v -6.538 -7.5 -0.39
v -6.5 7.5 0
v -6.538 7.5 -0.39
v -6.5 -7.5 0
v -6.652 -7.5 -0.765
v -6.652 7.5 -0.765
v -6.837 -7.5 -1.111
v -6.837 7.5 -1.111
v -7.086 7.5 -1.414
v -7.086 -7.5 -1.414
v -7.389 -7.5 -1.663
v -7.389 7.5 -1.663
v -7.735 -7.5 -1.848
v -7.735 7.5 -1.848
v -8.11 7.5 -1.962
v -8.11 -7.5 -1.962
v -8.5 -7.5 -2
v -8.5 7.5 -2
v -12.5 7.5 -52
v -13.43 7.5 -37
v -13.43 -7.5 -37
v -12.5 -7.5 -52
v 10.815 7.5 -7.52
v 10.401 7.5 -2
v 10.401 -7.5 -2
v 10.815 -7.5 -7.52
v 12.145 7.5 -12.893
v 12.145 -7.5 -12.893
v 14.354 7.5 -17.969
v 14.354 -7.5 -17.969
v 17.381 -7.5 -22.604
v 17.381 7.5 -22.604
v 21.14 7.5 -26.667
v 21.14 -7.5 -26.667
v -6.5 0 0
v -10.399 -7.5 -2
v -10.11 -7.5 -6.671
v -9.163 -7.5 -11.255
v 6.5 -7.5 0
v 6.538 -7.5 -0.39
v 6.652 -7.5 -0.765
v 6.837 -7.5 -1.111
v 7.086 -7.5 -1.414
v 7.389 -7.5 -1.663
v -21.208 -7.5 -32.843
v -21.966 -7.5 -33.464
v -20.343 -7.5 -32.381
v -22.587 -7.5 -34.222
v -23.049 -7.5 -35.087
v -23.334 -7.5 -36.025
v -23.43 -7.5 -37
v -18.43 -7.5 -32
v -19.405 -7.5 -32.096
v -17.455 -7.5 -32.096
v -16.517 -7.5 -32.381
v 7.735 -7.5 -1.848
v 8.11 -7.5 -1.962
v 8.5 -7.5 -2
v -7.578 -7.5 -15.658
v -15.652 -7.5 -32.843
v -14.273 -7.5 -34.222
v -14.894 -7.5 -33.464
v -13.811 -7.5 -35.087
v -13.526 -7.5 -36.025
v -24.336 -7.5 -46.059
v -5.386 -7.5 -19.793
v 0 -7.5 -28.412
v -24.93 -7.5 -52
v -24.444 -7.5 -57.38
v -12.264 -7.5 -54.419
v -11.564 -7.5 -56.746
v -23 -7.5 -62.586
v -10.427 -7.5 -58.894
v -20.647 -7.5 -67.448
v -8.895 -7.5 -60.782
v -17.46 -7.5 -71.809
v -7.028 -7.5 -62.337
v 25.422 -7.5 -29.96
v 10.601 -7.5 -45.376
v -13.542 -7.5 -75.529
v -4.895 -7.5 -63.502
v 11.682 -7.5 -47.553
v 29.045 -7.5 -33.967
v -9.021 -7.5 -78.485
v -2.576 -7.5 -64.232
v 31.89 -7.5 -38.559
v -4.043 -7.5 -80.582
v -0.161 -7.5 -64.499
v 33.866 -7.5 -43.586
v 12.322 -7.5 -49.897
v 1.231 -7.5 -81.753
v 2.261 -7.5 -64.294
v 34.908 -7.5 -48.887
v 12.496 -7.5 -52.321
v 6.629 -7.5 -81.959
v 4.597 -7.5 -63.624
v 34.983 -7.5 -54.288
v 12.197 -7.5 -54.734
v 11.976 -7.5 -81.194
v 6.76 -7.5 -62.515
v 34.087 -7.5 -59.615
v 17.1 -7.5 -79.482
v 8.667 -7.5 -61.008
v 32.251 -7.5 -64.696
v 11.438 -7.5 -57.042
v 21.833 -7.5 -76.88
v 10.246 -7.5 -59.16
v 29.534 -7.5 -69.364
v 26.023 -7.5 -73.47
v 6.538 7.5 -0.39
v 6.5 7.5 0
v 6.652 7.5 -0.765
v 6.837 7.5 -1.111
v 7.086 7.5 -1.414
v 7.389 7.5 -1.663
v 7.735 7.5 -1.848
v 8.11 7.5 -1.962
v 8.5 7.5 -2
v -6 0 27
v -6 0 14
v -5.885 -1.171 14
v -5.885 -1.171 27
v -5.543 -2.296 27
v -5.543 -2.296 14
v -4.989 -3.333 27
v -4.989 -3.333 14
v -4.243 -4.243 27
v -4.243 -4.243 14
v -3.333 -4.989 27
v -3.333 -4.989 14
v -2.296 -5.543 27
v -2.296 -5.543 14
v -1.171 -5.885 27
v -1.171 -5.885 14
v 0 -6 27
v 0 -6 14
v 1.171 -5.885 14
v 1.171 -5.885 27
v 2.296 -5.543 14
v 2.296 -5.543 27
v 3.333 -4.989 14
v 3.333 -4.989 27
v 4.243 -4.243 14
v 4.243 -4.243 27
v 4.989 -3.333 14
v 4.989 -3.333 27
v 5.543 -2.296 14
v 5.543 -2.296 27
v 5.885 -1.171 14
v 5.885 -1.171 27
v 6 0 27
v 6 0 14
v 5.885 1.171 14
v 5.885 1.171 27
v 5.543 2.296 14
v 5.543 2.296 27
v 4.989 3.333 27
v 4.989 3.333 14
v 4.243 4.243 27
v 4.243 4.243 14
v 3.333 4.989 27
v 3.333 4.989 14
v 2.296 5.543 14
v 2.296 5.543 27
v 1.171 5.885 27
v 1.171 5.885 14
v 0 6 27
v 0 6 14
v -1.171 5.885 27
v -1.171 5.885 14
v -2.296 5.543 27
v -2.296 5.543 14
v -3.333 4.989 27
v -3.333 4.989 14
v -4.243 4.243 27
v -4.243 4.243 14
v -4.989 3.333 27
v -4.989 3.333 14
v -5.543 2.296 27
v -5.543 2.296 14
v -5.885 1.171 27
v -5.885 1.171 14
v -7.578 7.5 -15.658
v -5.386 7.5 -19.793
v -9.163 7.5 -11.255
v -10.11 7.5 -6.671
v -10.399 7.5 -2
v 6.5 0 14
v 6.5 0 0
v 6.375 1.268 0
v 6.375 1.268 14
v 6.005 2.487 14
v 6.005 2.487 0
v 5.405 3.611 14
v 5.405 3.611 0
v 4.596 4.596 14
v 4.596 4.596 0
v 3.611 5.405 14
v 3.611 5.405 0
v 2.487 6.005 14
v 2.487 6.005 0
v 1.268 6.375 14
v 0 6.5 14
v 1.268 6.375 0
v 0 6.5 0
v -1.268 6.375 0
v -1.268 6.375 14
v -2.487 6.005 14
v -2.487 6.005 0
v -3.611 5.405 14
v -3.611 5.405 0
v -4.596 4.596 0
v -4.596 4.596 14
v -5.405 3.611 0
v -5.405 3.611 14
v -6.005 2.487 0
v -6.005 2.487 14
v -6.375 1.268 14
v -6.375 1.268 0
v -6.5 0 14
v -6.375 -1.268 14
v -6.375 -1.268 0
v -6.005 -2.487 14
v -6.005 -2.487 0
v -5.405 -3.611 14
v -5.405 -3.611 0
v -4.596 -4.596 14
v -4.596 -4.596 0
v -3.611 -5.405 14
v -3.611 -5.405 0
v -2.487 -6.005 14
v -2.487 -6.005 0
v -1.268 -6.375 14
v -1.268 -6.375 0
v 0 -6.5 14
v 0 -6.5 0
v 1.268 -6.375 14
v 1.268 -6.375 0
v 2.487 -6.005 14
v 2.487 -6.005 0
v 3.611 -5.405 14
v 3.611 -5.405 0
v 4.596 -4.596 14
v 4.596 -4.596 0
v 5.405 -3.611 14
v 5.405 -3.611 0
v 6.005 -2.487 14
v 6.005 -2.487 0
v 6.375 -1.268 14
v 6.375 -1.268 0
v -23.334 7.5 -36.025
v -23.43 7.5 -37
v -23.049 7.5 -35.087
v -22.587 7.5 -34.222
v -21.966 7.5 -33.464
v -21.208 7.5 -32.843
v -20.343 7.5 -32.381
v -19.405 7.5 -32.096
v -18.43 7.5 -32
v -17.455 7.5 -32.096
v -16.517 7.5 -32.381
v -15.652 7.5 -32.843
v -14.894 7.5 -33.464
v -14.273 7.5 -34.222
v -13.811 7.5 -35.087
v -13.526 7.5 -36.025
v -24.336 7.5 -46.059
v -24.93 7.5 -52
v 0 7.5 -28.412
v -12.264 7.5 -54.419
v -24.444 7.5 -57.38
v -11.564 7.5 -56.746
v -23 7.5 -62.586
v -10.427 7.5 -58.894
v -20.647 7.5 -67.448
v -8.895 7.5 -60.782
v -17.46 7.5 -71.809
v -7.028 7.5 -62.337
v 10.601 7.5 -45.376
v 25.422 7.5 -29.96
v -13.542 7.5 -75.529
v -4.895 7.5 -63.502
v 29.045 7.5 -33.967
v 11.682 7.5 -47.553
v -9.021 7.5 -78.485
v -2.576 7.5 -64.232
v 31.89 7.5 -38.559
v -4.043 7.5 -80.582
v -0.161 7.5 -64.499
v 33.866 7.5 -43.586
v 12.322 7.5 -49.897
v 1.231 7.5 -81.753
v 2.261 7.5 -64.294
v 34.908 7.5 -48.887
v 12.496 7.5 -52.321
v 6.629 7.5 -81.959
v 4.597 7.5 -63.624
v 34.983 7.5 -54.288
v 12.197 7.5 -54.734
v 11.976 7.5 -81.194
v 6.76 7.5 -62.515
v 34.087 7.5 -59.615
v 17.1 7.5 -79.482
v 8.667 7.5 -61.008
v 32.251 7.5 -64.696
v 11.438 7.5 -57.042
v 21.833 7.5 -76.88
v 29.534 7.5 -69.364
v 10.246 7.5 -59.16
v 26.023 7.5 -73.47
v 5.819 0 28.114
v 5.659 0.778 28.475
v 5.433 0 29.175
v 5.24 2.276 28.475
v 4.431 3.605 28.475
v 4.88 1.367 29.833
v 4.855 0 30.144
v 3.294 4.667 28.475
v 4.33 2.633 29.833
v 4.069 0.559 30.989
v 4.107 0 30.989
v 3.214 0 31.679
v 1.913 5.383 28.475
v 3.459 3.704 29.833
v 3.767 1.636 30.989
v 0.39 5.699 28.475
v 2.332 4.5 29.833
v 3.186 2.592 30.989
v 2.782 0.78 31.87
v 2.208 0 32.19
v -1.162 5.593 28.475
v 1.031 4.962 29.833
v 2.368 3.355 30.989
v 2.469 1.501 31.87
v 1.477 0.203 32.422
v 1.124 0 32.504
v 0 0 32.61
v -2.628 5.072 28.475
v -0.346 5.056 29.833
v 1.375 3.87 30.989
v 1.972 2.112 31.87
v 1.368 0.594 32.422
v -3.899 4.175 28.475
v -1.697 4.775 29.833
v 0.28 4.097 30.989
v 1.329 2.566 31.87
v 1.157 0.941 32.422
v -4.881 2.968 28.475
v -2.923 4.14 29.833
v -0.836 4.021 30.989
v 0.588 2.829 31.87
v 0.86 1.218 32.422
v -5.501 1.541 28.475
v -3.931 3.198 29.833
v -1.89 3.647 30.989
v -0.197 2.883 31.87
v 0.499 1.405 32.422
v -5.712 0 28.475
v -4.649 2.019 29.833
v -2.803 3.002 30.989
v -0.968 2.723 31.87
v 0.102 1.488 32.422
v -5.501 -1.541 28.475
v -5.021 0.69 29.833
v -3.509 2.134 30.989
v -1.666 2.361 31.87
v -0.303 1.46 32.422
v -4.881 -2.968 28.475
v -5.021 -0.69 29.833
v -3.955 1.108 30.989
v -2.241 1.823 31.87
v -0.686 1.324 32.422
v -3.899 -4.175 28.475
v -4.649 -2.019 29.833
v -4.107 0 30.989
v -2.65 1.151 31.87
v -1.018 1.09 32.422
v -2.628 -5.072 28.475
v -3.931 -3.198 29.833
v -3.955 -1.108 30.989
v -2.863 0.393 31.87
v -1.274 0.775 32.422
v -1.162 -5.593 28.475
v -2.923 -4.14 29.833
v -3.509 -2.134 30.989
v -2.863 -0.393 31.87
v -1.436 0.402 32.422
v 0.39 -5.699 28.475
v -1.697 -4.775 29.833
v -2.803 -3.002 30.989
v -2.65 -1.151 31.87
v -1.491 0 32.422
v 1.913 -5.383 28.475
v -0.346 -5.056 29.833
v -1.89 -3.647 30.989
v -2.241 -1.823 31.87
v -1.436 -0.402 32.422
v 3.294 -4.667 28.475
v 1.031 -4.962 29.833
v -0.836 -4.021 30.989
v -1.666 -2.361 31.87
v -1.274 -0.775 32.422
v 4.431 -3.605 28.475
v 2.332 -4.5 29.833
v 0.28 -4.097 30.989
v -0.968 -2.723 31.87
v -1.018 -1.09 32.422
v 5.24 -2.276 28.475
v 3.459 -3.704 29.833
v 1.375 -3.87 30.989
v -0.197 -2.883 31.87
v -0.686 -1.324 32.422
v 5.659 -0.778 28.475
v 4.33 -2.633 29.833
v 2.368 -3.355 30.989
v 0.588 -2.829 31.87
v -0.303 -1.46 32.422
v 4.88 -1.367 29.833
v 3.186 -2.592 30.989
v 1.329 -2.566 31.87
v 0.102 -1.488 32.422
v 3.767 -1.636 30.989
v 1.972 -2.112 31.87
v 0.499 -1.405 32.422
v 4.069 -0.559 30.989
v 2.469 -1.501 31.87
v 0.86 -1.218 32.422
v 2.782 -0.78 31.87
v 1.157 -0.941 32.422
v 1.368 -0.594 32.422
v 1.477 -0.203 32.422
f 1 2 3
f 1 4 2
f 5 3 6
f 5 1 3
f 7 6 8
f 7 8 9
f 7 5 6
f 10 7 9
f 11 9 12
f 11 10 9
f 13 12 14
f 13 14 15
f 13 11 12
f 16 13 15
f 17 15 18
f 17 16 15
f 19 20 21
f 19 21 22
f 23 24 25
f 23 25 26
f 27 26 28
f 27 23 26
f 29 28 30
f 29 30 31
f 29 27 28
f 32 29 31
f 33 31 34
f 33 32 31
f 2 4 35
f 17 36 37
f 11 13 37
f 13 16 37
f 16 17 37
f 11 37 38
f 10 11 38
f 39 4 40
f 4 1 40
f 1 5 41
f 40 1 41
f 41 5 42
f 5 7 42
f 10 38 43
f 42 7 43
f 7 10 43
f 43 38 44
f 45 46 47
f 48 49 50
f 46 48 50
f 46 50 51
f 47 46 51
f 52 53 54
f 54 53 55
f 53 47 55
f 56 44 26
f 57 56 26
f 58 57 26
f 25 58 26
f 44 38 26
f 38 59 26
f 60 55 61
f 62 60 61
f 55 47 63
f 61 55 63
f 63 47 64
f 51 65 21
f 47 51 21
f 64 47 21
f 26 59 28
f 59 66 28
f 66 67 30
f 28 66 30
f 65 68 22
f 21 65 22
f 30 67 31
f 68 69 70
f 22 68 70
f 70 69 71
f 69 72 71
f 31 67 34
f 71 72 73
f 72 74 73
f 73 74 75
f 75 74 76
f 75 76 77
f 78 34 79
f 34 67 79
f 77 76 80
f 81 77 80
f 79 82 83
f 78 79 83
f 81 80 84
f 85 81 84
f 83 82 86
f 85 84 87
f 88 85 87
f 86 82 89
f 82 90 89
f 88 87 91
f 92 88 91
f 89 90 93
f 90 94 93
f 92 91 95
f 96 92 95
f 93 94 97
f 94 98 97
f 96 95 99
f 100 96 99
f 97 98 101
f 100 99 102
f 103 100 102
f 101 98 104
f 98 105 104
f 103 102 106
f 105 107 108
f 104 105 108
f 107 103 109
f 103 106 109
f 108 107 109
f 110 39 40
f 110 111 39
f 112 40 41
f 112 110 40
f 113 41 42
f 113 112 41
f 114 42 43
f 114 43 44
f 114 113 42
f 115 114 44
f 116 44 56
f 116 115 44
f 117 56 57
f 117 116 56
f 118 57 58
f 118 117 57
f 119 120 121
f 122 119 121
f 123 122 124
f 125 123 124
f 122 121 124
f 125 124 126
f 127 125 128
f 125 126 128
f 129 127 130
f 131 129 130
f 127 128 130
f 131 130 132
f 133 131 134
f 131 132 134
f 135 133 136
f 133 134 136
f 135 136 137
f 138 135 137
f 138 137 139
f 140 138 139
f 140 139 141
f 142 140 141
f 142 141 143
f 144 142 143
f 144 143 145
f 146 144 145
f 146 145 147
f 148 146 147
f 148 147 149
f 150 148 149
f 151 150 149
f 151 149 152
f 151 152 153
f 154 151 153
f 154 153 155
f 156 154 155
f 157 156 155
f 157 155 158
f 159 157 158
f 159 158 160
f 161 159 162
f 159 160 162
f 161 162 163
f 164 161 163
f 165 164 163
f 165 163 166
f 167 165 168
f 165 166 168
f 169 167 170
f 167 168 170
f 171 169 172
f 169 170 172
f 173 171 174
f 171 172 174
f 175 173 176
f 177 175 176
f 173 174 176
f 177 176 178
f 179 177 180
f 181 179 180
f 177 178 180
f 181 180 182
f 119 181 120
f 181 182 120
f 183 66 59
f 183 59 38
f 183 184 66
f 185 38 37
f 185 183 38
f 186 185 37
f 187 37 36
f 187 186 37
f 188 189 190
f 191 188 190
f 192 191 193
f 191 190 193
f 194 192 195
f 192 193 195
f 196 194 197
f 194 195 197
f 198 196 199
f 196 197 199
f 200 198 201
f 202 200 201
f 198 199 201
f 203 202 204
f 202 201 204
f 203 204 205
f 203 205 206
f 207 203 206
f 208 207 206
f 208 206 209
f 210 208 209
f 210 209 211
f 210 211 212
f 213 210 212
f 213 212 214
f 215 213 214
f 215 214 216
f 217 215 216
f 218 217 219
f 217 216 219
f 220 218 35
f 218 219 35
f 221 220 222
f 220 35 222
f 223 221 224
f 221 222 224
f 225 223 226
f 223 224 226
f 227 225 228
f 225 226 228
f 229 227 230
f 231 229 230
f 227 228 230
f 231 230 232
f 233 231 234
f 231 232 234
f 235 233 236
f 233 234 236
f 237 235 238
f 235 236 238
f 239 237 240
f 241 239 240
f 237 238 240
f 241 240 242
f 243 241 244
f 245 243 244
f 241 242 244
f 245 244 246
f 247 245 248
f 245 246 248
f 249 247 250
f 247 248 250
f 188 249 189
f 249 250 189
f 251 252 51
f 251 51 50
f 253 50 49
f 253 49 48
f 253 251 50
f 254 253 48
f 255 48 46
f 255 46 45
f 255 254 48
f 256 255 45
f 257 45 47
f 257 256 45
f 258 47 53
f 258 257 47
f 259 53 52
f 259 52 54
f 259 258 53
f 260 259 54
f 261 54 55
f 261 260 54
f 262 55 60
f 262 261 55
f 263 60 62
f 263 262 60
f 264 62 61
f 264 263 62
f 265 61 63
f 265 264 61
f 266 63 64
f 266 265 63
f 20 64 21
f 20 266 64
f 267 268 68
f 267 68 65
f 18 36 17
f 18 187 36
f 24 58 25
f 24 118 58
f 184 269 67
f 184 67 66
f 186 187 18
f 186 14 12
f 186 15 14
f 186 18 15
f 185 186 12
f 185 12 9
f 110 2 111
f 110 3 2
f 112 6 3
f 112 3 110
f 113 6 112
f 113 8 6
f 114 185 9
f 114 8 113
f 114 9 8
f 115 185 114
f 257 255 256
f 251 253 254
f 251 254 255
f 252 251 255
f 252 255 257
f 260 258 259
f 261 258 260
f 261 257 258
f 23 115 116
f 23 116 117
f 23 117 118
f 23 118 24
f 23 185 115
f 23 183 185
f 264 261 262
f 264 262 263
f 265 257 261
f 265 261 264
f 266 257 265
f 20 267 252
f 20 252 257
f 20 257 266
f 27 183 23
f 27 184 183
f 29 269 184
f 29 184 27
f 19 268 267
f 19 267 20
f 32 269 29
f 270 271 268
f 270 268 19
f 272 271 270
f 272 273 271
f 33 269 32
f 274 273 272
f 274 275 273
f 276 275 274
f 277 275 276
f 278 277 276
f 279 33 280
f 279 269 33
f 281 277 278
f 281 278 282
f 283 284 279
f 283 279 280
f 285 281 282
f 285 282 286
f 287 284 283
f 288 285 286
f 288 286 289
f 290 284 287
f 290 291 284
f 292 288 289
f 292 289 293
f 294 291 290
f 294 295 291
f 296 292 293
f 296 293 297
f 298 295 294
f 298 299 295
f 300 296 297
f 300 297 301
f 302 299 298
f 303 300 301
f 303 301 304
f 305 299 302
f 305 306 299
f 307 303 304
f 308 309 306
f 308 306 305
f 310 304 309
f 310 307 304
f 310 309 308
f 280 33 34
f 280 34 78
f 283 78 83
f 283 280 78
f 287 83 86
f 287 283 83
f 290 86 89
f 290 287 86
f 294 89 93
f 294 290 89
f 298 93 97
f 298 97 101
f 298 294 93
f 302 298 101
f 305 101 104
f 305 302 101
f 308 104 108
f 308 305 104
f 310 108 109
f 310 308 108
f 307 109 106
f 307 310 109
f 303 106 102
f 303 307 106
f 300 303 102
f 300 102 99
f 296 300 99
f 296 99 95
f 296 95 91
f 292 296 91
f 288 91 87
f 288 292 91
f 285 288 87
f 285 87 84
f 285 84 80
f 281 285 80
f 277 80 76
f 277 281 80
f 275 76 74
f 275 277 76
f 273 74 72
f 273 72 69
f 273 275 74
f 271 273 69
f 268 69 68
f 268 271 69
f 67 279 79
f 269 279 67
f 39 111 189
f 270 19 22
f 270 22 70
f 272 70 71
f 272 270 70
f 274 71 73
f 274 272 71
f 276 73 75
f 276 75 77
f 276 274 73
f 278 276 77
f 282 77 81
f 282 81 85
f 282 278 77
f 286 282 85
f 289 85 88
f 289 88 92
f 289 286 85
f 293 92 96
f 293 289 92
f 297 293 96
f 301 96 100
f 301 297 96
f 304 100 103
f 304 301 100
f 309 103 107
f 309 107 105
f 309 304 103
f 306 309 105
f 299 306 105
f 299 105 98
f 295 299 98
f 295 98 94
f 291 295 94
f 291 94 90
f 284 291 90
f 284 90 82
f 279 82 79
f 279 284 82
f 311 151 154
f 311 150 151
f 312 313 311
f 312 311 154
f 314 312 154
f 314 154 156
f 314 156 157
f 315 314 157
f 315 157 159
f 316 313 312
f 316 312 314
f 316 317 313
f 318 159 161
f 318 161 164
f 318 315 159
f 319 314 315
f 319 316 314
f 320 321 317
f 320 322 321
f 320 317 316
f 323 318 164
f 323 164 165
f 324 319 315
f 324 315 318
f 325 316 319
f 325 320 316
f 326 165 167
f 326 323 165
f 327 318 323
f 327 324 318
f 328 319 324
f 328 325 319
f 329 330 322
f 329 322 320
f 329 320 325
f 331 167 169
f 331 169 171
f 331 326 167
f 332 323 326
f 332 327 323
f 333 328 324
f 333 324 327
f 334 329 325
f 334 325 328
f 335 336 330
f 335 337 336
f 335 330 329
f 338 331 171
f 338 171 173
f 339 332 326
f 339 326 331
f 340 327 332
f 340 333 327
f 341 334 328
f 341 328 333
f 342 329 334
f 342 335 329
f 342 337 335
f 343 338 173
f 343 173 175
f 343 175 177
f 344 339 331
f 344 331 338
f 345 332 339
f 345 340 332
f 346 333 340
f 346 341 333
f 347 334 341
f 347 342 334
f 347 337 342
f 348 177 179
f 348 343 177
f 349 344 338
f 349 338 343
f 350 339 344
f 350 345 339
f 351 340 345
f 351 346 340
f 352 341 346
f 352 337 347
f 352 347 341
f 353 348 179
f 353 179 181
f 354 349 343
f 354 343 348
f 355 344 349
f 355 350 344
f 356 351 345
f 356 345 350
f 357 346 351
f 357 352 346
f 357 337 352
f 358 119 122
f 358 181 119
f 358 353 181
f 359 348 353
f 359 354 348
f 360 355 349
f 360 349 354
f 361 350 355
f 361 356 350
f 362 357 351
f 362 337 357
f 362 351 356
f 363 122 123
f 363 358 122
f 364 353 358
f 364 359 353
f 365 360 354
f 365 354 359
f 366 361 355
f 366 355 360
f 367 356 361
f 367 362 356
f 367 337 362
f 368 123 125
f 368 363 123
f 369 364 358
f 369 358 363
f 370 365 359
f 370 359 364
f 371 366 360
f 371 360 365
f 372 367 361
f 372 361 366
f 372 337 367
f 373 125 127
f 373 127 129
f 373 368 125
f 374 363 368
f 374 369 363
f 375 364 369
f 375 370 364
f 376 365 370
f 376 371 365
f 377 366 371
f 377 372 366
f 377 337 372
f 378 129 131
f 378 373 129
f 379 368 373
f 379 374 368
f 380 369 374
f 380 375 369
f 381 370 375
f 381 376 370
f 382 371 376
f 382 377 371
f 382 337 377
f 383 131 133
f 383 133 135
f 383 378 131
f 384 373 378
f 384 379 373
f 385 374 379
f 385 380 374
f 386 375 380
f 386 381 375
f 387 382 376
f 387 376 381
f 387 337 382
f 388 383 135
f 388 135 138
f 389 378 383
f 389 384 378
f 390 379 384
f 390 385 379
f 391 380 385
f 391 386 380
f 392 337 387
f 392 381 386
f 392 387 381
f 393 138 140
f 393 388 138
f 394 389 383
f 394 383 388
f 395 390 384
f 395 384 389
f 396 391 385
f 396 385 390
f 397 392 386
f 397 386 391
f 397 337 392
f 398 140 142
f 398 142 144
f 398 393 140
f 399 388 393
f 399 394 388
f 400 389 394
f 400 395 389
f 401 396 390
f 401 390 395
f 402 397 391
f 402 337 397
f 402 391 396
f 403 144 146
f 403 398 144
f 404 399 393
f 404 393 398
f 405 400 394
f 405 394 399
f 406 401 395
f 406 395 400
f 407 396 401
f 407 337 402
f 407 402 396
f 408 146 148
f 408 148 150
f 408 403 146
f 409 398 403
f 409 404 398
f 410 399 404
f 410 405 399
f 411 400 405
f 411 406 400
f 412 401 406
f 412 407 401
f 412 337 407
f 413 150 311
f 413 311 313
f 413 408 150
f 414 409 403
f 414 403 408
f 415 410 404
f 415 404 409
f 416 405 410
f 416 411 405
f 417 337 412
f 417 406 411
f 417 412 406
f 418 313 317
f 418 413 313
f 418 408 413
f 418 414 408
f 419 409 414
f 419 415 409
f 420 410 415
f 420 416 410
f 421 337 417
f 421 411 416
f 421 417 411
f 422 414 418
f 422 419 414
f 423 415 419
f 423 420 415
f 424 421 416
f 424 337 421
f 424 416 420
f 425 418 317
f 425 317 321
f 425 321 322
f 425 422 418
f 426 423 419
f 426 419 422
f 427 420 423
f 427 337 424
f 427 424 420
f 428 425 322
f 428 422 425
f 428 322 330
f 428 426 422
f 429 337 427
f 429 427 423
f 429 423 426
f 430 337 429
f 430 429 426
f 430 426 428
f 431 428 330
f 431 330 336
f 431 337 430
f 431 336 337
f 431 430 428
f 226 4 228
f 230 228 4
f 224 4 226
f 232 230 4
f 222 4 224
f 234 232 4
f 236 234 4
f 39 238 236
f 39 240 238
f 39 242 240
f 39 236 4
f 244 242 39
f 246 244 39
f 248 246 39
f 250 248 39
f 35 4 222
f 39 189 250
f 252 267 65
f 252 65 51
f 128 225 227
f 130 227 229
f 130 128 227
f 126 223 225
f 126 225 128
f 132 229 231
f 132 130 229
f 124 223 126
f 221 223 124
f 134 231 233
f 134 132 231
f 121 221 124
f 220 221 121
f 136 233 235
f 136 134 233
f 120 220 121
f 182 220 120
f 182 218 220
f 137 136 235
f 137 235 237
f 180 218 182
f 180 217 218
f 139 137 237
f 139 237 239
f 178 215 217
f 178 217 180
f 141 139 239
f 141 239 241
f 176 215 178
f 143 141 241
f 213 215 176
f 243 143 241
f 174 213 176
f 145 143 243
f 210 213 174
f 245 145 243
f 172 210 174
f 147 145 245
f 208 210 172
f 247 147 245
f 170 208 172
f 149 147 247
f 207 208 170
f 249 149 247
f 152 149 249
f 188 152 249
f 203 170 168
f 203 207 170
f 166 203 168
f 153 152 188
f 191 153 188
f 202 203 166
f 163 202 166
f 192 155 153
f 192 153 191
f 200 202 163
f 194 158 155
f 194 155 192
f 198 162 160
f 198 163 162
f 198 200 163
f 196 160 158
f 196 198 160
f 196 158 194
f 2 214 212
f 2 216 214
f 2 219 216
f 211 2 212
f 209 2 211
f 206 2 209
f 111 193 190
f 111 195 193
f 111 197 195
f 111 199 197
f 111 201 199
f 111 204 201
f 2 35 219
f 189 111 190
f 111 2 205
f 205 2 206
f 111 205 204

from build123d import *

# Parameters (mm, degrees)
SCHIZZO1_R                   = 6.5
ESTRUSIONE_ESTRUSIONE1_DEPTH = 14
SCHIZZO2_R                   = 6
ESTRUSIONE_ESTRUSIONE2_DEPTH = 13
CUPOLA1_FACE_RADIUS          = 6
CUPOLA1_HEIGHT               = 5.61
ESTRUSIONE_ESTRUSIONE3_DEPTH = 7.5
RACCORDO1_R                  = 2


with BuildPart() as part:
    # Schizzo1 → Estrusione-Estrusione1 (new body)
    with BuildSketch(Plane.XY):
        Circle(SCHIZZO1_R)
    extrude(amount=ESTRUSIONE_ESTRUSIONE1_DEPTH)

    # Schizzo2 → Estrusione-Estrusione2 (add)
    with BuildSketch(Plane.XY.offset(14)):
        with Locations(Location((0, 0, 0), (0, 0, 180))):
            Circle(SCHIZZO2_R)
    extrude(amount=ESTRUSIONE_ESTRUSIONE2_DEPTH)

    # Cupola1: a dome of height H over a round flat face of radius A is a cap of a sphere of radius (A * A + H * H) / (2 * H)
    cupola1_r = (CUPOLA1_FACE_RADIUS * CUPOLA1_FACE_RADIUS + CUPOLA1_HEIGHT * CUPOLA1_HEIGHT) / (2 * CUPOLA1_HEIGHT)
    cupola1_base = Plane((0, 0, 27), z_dir=(0, 0, 1))
    with Locations(cupola1_base.offset(CUPOLA1_HEIGHT - cupola1_r)):
        cupola1_ball = Sphere(cupola1_r, mode=Mode.PRIVATE)
    add(split(cupola1_ball, bisect_by=cupola1_base, keep=Keep.TOP, mode=Mode.PRIVATE))

    # Schizzo3 → Estrusione-Estrusione3 (add, symmetric)
    with BuildSketch(Plane(origin=(0, 0, 0), x_dir=(1, 0, 0), z_dir=(0, 1, 0))):
        with BuildLine():
            Line((-6.5, 2), (-6.5, 0))
            Line((-6.5, 0), (0, 0))
            Line((0, 0), (0, 28.411501065))
            Line((0, 28.411501065), (-5.385587173, 19.792759953))
            ThreePointArc((-5.385587173, 19.792759953), (-9.163389911, 11.254561696), (-10.398586576, 2))
            Line((-10.398586576, 2), (-6.5, 2))
        make_face()
        with BuildLine():
            Line((0, 28.411501065), (0, 0))
            Line((0, 0), (6.5, 0))
            Line((6.5, 0), (6.5, 2))
            Line((6.5, 2), (10.401413424, 2))
            ThreePointArc((10.401413424, 2), (13.142849654, 15.477548319), (21.139966273, 26.667092863))
            ThreePointArc((21.139966273, 26.667092863), (19.525120405, 78.287820261), (-24.93, 52))
            Line((-24.93, 52), (-24.335940594, 46.059405941))
            Line((-24.335940594, 46.059405941), (-23.43, 37))
            ThreePointArc((-23.43, 37), (-18.43, 32), (-13.43, 37))
            Line((-13.43, 37), (-12.5, 52))
            ThreePointArc((-12.5, 52), (3.445466948, 64.015771199), (10.600601202, 45.376009197))
            Line((10.600601202, 45.376009197), (0, 28.411501065))
        make_face()
    extrude(amount=ESTRUSIONE_ESTRUSIONE3_DEPTH, both=True)

    # Raccordo1
    raccordo1_edges = [part.edges().sort_by_distance(p)[0] for p in [
        (6.5, 0, -2),
        (-6.5, 0, -2),
    ]]
    fillet(raccordo1_edges, radius=RACCORDO1_R - 0.0001)  # a hair under: the kernel refuses the full size


solid = part.part
